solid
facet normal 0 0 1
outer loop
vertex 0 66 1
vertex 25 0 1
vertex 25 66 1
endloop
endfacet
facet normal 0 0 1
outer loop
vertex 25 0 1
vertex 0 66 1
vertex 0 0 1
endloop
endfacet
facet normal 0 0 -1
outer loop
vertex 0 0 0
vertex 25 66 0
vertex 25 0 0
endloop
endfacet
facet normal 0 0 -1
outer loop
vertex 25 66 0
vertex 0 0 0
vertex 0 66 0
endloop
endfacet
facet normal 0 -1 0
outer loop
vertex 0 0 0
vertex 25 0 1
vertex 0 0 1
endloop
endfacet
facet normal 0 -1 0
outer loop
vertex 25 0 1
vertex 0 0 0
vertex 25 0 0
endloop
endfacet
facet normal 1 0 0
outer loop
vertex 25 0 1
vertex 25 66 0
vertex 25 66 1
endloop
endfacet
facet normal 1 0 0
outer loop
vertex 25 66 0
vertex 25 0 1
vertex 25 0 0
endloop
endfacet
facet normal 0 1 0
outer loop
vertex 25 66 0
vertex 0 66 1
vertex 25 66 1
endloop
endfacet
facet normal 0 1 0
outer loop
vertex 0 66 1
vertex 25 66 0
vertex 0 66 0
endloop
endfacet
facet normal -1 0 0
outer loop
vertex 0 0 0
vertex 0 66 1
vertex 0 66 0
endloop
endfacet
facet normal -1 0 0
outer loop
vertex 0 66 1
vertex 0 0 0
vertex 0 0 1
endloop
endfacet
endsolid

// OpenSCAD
big_side_thickness = 3;
side_thickness = 1;
box_x=126; // back to 130
box_y=70;
box_z=22;
lid_z=2;

slot_size=24;

module Dip(n=1) {
    translate([side_thickness*n+slot_size*(n-1), big_side_thickness, 0])
    cube(size=[slot_size, box_y-big_side_thickness*2, box_z-side_thickness]);
}

module Lid() {
    difference() { 
        cube(size=[box_x-side_thickness/2, box_y-big_side_thickness, lid_z]);
        
        translate([10, 10, 1.5]) linear_extrude(height = 0.5) {
            text(text="VYE", font="Bitter", size = 12);
        }
    }
}

module Box() {
    difference() {
        cube(size=[box_x, box_y, box_z]);
        
        // shorten each shelf
        translate([side_thickness, big_side_thickness, 0]) 
        cube(size=[box_x-side_thickness, box_y-big_side_thickness*2, 3]);
        
        // create slide
        translate([side_thickness/2, big_side_thickness/2, side_thickness])
        cube(size=[box_x-side_thickness/2, box_y-big_side_thickness, lid_z]);
        
        Dip(1);
        Dip(2);
        Dip(3);
        Dip(4);
        Dip(5);
    }
}


sb_x = 26;

module SmallBox() {
    difference() {
        cube(size=[sb_x, box_y, box_z]);
        Dip(1);
        
        translate([side_thickness, big_side_thickness, 0]) 
        cube(size=[sb_x-side_thickness, box_y-big_side_thickness*2, 3]);
        
        translate([side_thickness/2, big_side_thickness/2, side_thickness])
        cube(size=[sb_x-side_thickness/2, box_y-big_side_thickness, lid_z]);
    }
}

module SmallLid() {
    difference() {
        cube(size=[sb_x-side_thickness, box_y-big_side_thickness-1, lid_z-1]);
    }
}

//SmallBox();
SmallLid();


//Box();
//Lid();
        
